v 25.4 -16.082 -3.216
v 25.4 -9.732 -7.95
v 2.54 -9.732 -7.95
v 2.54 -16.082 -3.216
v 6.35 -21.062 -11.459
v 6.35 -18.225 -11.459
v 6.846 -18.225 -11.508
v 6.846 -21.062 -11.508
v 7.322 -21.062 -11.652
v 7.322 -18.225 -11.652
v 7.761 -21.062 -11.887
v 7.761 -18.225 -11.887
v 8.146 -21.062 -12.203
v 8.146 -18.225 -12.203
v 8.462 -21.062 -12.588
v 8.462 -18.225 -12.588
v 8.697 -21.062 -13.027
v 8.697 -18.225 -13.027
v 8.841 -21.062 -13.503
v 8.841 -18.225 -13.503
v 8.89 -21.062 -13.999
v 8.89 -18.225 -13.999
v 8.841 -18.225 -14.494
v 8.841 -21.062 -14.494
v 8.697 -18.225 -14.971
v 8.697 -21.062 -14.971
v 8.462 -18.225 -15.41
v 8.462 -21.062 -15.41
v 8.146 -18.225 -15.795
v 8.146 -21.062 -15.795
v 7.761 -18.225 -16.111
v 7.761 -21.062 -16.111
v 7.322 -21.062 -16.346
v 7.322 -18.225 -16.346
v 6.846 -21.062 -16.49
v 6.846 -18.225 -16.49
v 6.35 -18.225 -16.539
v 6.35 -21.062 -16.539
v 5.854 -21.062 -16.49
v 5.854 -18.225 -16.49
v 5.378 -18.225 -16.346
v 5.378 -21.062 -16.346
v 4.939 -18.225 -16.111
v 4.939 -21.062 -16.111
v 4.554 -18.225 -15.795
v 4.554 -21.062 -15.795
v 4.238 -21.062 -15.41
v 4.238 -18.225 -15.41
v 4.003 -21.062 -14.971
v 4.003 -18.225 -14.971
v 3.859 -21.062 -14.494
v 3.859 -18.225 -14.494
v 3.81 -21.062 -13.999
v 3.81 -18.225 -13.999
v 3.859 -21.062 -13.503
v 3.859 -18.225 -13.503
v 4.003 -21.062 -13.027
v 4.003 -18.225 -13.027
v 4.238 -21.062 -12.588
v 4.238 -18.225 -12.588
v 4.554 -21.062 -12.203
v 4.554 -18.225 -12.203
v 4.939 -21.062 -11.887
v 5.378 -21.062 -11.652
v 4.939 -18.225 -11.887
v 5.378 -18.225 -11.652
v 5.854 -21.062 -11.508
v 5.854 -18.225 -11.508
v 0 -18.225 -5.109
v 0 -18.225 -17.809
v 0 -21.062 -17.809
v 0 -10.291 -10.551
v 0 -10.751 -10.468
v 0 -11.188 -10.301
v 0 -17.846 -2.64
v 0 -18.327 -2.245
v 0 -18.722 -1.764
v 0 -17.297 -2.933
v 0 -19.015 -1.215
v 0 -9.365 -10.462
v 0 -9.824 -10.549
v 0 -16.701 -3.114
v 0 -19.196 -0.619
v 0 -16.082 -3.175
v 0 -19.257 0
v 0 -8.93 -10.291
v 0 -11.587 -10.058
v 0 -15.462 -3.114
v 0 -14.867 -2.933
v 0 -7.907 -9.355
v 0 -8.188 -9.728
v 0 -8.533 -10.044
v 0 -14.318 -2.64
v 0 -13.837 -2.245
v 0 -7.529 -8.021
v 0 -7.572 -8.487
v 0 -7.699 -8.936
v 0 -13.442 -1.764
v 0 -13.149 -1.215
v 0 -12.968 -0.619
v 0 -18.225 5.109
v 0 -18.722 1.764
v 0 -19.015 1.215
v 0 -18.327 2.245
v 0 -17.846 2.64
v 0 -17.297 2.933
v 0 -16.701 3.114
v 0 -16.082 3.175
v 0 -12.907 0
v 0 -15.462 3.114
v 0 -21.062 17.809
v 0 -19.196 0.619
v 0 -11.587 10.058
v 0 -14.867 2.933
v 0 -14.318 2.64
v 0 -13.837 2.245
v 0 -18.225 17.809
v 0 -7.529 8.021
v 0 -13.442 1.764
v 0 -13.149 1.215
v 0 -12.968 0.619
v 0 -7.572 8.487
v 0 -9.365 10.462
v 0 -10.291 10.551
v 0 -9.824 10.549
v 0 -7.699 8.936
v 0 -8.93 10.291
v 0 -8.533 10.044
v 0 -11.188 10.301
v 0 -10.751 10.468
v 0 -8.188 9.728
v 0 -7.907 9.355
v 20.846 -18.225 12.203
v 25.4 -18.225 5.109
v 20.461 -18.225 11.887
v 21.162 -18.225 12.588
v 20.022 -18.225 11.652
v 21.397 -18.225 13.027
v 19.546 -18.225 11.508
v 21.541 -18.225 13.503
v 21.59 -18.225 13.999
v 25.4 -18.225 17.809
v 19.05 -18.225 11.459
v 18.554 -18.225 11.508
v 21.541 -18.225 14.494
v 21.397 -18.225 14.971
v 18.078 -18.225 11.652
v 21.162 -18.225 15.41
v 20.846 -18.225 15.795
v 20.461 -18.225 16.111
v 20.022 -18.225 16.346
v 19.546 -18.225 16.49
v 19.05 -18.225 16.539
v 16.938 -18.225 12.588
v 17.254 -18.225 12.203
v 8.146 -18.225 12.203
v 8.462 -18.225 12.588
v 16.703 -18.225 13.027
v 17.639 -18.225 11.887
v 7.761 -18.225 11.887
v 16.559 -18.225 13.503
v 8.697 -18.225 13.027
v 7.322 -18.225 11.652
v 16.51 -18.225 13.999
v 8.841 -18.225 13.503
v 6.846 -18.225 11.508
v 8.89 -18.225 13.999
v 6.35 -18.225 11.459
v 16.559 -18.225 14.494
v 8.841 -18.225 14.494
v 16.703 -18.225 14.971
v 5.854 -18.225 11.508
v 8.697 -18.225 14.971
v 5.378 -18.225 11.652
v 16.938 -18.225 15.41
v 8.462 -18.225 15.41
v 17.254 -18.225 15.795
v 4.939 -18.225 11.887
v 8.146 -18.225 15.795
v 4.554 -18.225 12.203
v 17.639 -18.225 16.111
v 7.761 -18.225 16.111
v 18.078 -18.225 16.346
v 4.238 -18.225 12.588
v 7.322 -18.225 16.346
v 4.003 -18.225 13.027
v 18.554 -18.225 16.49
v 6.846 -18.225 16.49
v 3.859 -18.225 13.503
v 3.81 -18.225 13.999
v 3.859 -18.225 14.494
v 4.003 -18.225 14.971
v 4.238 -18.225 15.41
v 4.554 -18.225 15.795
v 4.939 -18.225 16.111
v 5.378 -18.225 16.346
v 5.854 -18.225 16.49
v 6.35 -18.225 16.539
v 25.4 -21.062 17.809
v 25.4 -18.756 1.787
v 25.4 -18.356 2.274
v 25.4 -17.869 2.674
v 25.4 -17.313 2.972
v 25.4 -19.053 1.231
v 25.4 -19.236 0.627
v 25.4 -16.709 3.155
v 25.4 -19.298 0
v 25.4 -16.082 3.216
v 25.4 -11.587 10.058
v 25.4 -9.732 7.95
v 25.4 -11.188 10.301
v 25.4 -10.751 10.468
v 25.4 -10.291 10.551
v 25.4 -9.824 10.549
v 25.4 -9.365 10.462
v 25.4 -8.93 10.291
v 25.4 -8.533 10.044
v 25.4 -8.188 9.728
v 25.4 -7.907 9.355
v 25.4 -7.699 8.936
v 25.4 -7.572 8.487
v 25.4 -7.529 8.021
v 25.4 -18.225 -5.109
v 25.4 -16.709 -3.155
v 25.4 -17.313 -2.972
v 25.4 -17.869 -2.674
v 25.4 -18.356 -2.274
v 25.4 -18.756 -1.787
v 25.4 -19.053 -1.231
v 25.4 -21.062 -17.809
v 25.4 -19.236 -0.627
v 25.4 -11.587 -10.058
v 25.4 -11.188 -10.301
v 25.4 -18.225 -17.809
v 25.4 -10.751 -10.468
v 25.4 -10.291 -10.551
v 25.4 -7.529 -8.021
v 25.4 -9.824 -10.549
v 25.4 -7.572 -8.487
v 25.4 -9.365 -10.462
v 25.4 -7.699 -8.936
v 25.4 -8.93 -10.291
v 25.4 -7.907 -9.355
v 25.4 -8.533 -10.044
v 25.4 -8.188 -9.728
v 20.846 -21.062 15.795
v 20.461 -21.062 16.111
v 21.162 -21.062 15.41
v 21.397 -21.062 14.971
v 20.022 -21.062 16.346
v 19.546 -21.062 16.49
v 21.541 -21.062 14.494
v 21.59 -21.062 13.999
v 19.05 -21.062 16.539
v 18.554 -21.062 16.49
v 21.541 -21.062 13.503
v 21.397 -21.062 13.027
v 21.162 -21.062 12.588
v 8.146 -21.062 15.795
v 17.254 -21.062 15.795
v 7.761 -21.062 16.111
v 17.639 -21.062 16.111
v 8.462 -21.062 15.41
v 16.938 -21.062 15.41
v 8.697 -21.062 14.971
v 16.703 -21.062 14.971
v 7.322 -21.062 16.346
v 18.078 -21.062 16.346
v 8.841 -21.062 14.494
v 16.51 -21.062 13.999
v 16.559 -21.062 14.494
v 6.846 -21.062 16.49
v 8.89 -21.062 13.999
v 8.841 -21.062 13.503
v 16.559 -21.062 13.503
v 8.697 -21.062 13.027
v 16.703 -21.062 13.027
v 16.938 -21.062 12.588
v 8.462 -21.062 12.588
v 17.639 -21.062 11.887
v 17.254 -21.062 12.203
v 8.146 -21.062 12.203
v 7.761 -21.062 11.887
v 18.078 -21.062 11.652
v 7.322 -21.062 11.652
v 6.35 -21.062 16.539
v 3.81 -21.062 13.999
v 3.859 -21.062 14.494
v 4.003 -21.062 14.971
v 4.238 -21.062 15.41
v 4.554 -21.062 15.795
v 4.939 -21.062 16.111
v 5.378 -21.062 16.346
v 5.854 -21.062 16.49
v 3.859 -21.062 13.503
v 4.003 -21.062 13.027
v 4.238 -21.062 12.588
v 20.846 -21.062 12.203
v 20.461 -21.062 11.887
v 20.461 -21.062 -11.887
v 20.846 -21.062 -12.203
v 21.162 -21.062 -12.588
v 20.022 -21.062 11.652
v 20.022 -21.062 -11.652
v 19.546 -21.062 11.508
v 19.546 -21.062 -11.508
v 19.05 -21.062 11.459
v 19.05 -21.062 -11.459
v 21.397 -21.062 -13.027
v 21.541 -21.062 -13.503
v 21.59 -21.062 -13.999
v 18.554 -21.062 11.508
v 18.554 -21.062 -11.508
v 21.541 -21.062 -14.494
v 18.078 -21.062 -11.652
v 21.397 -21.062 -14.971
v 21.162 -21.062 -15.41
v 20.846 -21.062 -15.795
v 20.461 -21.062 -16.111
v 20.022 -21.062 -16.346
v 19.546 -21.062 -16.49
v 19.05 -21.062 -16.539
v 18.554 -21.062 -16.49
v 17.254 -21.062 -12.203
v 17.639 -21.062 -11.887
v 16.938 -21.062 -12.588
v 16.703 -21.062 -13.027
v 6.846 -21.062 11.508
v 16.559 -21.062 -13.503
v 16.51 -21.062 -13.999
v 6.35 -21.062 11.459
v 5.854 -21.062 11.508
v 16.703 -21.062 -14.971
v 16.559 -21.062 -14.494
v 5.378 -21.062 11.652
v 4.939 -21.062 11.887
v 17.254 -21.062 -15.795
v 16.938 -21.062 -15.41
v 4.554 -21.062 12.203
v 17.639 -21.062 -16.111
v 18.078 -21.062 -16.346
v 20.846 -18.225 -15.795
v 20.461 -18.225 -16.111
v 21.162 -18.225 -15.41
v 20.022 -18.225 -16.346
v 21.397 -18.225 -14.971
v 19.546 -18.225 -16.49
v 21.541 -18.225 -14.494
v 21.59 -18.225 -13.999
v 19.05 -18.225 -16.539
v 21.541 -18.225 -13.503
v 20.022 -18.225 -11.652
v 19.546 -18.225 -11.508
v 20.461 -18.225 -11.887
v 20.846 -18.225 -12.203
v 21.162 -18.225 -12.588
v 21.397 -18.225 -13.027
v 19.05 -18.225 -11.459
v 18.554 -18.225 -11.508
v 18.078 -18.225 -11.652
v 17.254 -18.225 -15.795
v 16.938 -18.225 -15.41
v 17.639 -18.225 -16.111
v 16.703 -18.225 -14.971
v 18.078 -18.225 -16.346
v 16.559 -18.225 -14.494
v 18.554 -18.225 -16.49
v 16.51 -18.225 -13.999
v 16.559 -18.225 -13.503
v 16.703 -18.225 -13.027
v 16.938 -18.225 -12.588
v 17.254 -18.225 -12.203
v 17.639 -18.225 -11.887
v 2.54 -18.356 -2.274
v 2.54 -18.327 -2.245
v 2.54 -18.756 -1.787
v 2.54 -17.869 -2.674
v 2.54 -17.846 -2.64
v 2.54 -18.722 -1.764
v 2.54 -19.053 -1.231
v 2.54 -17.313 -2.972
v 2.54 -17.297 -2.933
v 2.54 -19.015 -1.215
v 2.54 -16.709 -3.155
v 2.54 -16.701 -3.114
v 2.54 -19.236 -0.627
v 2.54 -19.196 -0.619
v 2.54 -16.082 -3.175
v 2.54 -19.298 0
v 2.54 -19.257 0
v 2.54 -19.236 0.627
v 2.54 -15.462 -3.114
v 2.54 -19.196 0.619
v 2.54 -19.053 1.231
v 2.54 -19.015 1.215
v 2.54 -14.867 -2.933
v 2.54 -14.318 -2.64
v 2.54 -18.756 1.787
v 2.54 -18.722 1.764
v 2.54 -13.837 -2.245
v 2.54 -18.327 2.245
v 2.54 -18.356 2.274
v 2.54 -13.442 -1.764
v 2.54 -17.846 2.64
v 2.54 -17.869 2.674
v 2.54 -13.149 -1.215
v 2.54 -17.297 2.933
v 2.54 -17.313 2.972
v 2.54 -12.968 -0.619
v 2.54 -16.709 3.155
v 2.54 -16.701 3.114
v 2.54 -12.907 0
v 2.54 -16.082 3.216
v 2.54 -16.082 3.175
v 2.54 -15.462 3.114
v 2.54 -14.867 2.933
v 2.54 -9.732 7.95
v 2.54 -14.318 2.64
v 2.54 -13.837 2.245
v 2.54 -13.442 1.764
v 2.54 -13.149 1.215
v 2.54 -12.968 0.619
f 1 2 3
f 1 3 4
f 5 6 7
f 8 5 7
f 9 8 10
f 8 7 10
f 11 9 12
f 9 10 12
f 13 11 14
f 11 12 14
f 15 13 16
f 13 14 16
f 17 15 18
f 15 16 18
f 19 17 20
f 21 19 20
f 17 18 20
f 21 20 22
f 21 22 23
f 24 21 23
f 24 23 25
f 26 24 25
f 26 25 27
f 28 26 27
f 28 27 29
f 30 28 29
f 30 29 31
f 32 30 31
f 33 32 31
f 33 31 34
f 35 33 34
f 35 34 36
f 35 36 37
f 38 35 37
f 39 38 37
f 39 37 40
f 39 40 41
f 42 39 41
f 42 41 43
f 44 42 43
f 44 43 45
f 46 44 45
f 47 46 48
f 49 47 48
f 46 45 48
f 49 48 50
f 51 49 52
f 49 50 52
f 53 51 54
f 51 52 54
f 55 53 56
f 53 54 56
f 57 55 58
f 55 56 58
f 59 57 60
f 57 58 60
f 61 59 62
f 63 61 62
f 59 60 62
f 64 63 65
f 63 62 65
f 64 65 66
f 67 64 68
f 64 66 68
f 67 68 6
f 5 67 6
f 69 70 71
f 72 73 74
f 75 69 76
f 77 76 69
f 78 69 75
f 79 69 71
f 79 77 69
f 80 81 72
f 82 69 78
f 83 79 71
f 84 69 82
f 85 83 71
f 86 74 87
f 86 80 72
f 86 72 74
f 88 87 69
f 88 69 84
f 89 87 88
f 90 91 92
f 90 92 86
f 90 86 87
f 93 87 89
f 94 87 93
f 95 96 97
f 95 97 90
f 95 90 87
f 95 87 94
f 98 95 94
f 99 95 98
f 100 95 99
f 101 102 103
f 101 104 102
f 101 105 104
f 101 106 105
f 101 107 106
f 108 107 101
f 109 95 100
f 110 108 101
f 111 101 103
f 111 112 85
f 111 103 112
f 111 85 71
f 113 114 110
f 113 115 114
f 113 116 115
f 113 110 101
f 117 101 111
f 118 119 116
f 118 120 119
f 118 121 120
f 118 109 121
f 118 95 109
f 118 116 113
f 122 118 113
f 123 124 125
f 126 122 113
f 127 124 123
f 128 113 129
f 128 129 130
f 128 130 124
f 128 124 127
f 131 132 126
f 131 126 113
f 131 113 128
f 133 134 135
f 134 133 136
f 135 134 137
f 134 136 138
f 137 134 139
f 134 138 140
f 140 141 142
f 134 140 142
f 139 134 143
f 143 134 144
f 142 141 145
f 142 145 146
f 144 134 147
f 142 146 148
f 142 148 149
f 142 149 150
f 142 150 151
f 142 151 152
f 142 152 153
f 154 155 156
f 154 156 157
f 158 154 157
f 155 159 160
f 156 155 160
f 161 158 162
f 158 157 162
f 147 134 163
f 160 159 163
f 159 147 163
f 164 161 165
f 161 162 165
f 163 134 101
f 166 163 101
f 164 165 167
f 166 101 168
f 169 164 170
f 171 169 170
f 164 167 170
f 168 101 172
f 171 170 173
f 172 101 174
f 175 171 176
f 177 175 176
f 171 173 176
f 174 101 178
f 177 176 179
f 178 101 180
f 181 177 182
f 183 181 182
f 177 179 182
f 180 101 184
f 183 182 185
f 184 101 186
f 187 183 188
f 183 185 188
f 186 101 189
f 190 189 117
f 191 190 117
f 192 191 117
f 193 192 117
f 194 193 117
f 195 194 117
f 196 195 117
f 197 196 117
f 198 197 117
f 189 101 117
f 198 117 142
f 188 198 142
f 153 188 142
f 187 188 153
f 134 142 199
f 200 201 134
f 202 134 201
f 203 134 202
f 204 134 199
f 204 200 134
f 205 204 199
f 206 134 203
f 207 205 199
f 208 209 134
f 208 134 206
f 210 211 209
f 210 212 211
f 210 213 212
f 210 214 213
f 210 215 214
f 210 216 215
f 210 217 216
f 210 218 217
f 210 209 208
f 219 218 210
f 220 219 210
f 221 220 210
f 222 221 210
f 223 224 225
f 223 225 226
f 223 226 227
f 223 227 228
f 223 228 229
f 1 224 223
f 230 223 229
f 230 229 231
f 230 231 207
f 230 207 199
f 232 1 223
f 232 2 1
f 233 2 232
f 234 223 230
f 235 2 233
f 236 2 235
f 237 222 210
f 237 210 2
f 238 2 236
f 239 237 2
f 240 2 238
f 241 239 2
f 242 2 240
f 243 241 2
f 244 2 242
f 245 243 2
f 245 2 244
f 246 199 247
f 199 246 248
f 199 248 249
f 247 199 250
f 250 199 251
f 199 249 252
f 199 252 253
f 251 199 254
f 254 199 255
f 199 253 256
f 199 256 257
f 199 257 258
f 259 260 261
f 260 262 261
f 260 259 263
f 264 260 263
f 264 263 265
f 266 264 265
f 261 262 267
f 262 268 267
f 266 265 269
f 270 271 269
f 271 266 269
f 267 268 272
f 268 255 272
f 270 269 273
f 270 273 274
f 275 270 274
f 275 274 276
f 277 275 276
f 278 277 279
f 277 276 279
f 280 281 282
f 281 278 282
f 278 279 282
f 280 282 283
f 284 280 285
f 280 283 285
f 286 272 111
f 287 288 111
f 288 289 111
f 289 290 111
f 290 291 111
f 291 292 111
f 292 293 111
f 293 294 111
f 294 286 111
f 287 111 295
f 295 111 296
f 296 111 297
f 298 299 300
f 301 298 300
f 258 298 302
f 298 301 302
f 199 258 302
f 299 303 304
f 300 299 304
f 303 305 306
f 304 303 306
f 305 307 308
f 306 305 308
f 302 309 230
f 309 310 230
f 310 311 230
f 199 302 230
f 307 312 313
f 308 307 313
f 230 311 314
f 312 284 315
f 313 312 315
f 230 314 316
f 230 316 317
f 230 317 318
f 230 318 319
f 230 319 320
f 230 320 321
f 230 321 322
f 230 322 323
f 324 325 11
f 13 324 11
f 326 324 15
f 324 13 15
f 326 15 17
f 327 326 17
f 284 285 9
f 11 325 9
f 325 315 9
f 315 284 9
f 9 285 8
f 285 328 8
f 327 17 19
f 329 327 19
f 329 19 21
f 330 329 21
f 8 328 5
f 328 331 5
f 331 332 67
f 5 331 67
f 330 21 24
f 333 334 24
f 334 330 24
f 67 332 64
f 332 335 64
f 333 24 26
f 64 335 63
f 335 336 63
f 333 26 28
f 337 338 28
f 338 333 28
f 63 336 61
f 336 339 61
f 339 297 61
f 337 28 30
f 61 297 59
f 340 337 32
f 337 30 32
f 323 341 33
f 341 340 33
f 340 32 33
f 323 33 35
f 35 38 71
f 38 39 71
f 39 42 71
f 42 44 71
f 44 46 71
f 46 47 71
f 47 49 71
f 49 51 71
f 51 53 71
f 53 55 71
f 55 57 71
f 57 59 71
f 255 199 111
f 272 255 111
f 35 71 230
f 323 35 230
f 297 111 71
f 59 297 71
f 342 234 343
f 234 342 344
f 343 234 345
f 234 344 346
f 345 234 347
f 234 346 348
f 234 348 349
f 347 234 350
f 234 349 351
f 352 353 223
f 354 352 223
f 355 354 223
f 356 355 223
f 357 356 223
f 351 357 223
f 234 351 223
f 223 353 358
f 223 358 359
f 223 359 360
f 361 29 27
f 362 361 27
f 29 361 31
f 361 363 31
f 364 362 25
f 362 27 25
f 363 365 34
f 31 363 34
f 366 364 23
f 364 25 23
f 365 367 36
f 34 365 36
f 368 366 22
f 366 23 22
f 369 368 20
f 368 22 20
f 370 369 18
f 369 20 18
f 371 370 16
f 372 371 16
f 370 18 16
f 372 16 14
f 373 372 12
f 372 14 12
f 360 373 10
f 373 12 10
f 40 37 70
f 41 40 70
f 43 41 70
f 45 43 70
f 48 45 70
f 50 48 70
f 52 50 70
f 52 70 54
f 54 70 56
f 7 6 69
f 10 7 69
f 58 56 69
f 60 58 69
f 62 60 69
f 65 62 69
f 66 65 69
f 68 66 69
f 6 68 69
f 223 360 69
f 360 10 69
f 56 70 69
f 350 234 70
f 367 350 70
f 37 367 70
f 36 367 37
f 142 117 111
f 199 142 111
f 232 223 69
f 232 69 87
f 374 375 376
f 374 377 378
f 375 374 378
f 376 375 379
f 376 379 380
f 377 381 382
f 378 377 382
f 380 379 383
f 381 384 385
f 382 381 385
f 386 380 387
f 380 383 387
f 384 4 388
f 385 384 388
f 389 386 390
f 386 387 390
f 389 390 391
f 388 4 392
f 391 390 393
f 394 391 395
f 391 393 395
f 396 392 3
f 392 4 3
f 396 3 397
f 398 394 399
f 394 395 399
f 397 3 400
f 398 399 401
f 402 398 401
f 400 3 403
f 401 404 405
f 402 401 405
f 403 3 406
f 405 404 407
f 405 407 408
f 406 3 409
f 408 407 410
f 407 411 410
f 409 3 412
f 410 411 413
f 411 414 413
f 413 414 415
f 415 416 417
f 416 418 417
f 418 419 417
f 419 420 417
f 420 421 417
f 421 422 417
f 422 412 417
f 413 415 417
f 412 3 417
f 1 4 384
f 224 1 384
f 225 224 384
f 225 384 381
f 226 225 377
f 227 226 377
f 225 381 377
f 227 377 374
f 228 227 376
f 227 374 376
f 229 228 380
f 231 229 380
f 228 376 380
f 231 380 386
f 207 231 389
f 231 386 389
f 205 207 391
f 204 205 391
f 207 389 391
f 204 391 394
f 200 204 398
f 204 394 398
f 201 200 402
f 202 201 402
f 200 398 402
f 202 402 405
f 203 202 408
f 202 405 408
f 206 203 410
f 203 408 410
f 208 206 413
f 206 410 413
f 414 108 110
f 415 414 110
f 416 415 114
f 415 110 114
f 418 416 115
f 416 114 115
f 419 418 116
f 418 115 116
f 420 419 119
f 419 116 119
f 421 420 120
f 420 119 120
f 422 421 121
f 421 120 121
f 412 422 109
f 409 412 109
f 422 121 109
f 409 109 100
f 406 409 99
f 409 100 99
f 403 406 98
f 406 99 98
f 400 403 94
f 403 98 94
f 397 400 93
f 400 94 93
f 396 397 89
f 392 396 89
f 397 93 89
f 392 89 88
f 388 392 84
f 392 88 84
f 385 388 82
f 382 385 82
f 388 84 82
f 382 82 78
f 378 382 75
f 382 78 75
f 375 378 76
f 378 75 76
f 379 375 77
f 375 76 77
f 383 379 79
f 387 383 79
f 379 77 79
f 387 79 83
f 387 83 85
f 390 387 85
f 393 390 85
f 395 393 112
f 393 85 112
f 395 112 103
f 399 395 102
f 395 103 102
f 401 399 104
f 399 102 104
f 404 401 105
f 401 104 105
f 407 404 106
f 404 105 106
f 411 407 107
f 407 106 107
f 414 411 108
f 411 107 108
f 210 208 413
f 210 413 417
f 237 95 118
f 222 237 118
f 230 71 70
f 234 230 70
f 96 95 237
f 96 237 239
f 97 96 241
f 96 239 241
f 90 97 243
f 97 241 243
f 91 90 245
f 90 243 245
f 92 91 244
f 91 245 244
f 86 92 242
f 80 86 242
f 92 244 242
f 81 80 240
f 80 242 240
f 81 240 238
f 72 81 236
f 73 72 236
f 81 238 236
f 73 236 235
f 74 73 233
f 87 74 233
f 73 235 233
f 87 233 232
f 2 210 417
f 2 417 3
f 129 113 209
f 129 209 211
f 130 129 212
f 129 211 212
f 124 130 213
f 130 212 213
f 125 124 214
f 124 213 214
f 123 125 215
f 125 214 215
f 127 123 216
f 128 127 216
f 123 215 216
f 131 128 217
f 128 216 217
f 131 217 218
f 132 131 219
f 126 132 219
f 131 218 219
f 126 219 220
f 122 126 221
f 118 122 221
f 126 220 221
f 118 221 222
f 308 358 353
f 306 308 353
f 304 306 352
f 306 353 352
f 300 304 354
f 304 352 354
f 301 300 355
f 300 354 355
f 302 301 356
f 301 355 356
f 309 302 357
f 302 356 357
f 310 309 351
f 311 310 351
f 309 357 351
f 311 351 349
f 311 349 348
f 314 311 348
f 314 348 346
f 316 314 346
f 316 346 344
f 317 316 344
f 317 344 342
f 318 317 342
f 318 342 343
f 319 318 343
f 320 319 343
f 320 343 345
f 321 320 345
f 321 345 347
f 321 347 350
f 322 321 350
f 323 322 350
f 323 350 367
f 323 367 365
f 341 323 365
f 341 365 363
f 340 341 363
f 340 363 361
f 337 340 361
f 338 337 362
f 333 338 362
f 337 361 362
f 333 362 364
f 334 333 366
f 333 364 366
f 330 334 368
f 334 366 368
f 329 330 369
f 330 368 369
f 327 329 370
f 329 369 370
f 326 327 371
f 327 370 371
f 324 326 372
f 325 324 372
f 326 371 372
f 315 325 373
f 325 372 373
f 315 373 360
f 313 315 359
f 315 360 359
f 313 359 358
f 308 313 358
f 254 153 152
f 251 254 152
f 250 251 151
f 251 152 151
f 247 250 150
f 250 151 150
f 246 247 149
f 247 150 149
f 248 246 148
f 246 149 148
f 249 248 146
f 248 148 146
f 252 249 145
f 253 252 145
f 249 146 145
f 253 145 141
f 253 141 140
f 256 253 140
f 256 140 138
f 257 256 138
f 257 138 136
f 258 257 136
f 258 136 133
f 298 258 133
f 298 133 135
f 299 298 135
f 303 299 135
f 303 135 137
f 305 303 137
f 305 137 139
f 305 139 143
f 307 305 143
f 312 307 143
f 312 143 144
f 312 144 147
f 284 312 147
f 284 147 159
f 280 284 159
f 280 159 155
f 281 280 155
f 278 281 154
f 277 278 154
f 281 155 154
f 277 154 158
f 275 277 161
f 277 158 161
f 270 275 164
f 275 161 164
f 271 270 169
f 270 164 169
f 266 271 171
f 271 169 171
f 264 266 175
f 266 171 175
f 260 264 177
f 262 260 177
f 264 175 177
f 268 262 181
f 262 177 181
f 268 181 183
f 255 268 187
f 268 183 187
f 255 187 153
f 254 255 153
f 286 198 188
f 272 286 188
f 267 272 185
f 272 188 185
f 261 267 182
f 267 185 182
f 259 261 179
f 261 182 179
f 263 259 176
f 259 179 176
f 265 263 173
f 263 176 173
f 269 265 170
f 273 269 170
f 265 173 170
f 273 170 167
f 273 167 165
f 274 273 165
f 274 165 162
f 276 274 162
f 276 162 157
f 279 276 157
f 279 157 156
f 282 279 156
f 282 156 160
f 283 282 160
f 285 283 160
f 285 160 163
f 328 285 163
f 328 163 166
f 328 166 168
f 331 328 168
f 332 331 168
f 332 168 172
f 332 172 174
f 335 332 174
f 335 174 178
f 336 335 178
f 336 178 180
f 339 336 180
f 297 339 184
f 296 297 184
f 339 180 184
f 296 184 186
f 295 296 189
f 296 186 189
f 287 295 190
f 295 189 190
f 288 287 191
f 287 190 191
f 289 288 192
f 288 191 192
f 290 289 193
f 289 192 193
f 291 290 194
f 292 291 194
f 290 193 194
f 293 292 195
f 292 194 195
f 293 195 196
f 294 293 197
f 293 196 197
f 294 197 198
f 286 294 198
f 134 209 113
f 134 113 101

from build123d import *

# Parameters (mm, degrees)
BOSS_EXTRUDE2_DEPTH = 25.4
SKETCH13_R          = 2.54
CUT_EXTRUDE4_DEPTH  = 6.35
SKETCH12_R          = 2.54
CUT_EXTRUDE5_DEPTH  = 6.35
SKETCH14_R          = 2.54
CUT_EXTRUDE6_DEPTH  = 6.35
BOSS_EXTRUDE3_DEPTH = 2.54
FILLET1_R           = 2.54
FILLET2_R           = 2.54
SKETCH18_R          = 3.175
CUT_EXTRUDE7_DEPTH  = 2.54


with BuildPart() as part:
    # Sketch6 → Boss-Extrude2 (new body)
    with BuildSketch(Plane(origin=(0, 0, 0), x_dir=(0, 0, -1), z_dir=(1, 0, 0))):
        Polygon((13.082661166, -7.52885515), (-13.082661166, -7.52885515), (-5.10893156, -18.225236378), (-17.80893156, -18.225236378), (-17.80893156, -21.061645655), (17.80893156, -21.061645655), (17.80893156, -18.225236378), (5.10893156, -18.225236378), align=None)
        with BuildLine():
            Line((3.81, -9.731855656), (7.950045252, -9.731855656))
            Line((7.950045252, -9.731855656), (3.216371131, -16.081855656))
            ThreePointArc((3.216371131, -16.081855656), (0, -19.298226787), (-3.216371131, -16.081855656))
            Line((-3.216371131, -16.081855656), (-7.950045252, -9.731855656))
            Line((-7.950045252, -9.731855656), (-3.81, -9.731855656))
            Line((-3.81, -9.731855656), (3.81, -9.731855656))
        make_face(mode=Mode.SUBTRACT)
    extrude(amount=BOSS_EXTRUDE2_DEPTH)

    # Sketch13 → Cut-Extrude4 (cut)
    with BuildSketch(Plane(origin=(0, -18.225236378, 0), x_dir=(1, 0, 0), z_dir=(0, 1, 0))):
        with Locations((19.05, -13.99893156)):
            Circle(SKETCH13_R)
    extrude(amount=-CUT_EXTRUDE4_DEPTH, mode=Mode.SUBTRACT)

    # Sketch12 → Cut-Extrude5 (cut)
    with BuildSketch(Plane(origin=(0, -18.225236378, 0), x_dir=(1, 0, 0), z_dir=(0, 1, 0))):
        with Locations((6.35, -13.99893156)):
            Circle(SKETCH12_R)
    extrude(amount=-CUT_EXTRUDE5_DEPTH, mode=Mode.SUBTRACT)

    # Sketch14 → Cut-Extrude6 (cut)
    with BuildSketch(Plane(origin=(0, -18.225236378, 0), x_dir=(1, 0, 0), z_dir=(0, 1, 0))):
        with Locations((19.05, 13.99893156)):
            Circle(SKETCH14_R)
        with Locations((6.35, 13.99893156)):
            Circle(SKETCH14_R)
    extrude(amount=-CUT_EXTRUDE6_DEPTH, mode=Mode.SUBTRACT)

    # Sketch6<4> → Boss-Extrude3 (add)
    with BuildSketch(Plane(origin=(0, 0, 0), x_dir=(0, 0, -1), z_dir=(1, 0, 0))):
        with BuildLine():
            Line((7.950045252, -9.731855656), (3.216371131, -16.081855656))
            ThreePointArc((3.216371131, -16.081855656), (0, -19.298226787), (-3.216371131, -16.081855656))
            Line((-3.216371131, -16.081855656), (-7.950045252, -9.731855656))
            Line((-7.950045252, -9.731855656), (-3.81, -9.731855656))
            Line((-3.81, -9.731855656), (3.81, -9.731855656))
            Line((3.81, -9.731855656), (7.950045252, -9.731855656))
        make_face()
    extrude(amount=BOSS_EXTRUDE3_DEPTH)

    # Fillet1
    fillet1_edges = [part.edges().sort_by_distance(p)[0] for p in [
        (12.7, -7.52885515, 13.082661166),
    ]]
    fillet(fillet1_edges, radius=FILLET1_R)

    # Fillet2
    fillet2_edges = [part.edges().sort_by_distance(p)[0] for p in [
        (12.7, -7.52885515, -13.082661166),
    ]]
    fillet(fillet2_edges, radius=FILLET2_R)

    # Sketch18 → Cut-Extrude7 (cut)
    with BuildSketch(Plane.ZY):
        with Locations((0, -16.081855656)):
            Circle(SKETCH18_R)
    extrude(amount=-CUT_EXTRUDE7_DEPTH, mode=Mode.SUBTRACT)


solid = part.part
